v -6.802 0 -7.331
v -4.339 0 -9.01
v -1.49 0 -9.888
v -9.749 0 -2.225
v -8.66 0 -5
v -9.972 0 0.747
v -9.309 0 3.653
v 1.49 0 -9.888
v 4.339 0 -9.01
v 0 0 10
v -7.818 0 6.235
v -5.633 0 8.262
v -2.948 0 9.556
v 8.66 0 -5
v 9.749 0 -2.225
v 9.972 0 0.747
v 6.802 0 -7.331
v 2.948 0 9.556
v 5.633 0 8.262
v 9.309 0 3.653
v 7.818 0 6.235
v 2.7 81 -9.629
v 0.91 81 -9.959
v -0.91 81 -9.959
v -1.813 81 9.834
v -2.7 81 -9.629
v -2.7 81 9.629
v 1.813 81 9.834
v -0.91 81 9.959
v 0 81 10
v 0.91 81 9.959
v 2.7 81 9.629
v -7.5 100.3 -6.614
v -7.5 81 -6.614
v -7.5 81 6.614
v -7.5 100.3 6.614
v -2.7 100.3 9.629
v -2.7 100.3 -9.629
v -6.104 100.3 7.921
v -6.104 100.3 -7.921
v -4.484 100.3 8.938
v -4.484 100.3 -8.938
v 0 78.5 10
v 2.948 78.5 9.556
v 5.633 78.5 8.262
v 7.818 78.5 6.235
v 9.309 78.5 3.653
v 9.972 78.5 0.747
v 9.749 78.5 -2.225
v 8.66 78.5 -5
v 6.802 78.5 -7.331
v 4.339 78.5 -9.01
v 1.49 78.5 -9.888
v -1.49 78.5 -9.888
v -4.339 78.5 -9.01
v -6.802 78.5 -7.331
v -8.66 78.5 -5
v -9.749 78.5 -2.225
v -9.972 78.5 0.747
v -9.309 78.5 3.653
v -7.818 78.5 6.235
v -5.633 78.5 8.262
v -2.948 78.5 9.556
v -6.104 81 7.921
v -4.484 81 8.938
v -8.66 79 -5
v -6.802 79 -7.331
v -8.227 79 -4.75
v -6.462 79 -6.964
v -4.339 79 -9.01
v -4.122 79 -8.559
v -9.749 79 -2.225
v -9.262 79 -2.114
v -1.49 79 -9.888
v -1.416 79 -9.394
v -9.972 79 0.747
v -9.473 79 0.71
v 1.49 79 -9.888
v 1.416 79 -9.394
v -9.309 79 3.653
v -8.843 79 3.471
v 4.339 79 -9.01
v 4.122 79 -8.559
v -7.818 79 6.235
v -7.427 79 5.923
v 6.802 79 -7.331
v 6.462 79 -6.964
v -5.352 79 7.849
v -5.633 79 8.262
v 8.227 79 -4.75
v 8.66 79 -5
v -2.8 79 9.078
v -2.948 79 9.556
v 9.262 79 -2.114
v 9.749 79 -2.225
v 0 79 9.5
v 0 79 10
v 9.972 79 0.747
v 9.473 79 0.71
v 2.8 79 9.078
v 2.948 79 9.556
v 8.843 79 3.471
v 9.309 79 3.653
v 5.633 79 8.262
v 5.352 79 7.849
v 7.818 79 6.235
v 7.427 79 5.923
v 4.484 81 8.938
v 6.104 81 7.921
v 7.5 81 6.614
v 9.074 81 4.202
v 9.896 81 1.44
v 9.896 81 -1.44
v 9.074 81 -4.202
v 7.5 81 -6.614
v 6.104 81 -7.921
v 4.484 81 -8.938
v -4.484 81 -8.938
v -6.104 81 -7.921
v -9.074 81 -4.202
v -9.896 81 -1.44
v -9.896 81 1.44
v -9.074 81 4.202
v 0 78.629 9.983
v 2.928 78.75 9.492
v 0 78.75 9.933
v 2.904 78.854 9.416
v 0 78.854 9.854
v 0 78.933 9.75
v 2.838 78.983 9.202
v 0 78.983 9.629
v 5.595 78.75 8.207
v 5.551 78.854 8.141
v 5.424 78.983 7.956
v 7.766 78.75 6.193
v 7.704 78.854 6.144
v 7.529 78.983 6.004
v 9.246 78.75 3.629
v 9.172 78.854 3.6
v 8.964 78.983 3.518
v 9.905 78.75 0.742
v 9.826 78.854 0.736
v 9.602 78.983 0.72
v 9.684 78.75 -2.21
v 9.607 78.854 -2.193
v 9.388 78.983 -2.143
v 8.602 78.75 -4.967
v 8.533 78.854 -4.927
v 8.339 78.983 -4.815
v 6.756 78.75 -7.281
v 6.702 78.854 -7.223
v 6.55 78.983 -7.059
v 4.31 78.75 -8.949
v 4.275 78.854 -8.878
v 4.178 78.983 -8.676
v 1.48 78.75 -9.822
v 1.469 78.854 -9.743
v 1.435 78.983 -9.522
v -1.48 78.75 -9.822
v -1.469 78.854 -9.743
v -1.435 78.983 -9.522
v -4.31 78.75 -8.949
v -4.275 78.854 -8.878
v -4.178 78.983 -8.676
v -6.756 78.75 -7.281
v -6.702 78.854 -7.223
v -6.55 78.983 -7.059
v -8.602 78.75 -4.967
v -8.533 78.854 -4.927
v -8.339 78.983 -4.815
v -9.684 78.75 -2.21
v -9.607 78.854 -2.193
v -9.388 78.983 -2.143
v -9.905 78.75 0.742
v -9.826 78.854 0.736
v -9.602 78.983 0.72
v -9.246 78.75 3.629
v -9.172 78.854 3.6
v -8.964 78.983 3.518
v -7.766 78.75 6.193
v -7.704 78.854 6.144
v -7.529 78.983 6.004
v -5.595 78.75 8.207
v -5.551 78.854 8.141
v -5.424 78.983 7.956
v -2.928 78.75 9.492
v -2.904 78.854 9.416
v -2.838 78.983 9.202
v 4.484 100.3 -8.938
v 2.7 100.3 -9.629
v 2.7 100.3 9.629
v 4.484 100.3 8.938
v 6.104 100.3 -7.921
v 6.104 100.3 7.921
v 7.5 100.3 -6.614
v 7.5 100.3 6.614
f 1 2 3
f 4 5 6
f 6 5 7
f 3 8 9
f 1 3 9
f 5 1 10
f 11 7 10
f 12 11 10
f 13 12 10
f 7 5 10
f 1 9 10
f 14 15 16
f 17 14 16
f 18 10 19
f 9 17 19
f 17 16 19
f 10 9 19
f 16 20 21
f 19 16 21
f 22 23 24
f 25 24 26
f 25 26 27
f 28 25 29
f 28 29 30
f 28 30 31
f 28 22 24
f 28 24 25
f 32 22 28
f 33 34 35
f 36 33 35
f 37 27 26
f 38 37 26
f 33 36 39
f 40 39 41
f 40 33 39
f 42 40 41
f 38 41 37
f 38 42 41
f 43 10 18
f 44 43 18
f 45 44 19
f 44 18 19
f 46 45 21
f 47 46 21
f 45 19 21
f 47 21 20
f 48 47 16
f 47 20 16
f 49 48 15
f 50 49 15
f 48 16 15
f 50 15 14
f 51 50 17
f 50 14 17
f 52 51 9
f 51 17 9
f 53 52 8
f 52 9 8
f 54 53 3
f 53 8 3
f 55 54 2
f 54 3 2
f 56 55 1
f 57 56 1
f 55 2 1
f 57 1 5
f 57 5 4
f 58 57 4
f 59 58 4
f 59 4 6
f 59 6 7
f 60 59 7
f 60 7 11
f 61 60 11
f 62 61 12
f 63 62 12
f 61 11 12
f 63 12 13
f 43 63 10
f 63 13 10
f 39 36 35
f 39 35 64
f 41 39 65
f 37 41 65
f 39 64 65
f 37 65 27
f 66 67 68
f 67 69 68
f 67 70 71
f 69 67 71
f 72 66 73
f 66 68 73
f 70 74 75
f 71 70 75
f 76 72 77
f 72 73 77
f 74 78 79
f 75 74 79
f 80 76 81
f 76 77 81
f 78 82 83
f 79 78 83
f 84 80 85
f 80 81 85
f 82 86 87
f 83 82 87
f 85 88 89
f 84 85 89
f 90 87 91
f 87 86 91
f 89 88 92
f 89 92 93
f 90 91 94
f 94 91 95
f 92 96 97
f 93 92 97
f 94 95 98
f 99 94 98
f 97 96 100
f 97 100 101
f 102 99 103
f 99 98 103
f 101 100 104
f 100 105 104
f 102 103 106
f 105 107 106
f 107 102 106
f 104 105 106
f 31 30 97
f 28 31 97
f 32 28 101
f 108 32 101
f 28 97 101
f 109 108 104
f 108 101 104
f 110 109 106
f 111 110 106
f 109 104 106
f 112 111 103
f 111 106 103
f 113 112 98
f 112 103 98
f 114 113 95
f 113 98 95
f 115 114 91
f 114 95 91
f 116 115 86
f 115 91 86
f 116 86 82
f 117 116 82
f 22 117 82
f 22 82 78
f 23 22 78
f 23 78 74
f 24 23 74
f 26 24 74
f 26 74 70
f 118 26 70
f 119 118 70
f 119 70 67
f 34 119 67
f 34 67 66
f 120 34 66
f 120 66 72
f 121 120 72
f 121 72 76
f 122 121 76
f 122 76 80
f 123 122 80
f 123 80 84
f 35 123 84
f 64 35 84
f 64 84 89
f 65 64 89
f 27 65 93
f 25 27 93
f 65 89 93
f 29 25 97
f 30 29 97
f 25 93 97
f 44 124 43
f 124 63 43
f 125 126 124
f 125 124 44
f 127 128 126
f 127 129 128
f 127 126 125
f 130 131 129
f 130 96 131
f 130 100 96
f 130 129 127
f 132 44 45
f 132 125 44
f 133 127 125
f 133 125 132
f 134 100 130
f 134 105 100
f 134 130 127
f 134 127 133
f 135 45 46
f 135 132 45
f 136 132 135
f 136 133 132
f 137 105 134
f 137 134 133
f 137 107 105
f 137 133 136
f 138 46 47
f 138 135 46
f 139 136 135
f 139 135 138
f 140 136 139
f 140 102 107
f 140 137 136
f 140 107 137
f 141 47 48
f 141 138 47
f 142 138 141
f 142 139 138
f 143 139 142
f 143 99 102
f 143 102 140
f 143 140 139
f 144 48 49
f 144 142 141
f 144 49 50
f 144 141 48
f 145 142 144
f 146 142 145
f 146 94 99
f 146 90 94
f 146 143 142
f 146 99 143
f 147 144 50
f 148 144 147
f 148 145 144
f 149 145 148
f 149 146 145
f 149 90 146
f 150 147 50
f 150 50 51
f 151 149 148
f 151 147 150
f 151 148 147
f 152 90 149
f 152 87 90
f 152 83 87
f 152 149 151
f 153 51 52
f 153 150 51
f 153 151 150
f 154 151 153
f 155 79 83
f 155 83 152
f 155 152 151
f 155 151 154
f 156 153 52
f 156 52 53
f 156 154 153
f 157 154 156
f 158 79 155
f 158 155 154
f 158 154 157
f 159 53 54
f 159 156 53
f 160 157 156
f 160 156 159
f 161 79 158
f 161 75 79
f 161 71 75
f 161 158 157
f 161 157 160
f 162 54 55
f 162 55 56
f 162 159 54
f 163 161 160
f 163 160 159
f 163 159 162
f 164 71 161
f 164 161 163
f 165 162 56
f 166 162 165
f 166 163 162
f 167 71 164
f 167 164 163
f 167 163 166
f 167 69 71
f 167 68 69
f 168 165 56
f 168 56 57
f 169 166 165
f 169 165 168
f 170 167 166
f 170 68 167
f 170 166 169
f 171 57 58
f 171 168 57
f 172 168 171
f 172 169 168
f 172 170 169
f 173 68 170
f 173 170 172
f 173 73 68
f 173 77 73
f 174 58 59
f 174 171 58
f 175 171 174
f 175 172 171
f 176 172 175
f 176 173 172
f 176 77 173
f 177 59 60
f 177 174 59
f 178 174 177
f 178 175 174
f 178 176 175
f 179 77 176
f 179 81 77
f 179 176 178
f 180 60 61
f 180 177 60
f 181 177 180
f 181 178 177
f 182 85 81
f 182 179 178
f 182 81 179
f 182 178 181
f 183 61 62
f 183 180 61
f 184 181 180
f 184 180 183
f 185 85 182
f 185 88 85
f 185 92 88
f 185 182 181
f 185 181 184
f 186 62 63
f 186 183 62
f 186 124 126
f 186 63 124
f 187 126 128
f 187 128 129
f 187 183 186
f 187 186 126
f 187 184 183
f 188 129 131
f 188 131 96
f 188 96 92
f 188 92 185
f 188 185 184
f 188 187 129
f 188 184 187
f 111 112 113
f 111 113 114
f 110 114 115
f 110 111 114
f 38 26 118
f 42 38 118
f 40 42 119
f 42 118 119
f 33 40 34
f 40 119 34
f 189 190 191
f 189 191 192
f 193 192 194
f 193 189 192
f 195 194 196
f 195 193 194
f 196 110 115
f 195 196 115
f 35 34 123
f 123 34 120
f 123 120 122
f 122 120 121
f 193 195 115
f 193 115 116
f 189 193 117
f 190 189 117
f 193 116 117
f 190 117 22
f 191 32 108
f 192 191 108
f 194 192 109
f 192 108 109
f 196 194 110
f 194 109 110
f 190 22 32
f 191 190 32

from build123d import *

# Parameters (mm, degrees)
SKETCH1_R           = 10
BOSS_EXTRUDE1_DEPTH = 79
FILLET1_R           = 0.5
SKETCH2_R           = 10
BOSS_EXTRUDE2_DEPTH = 2
BOSS_EXTRUDE3_DEPTH = 19.3


with BuildPart() as part:
    # Sketch1 → Boss-Extrude1 (new body)
    with BuildSketch(Plane(origin=(0, 0, 0), x_dir=(1, 0, 0), z_dir=(0, 1, 0))):
        with Locations(Location((0, 0, 0), (0, 0, 270))):
            Circle(SKETCH1_R)
    extrude(amount=BOSS_EXTRUDE1_DEPTH)

    # Fillet1
    fillet1_edges = [part.edges().sort_by_distance(p)[0] for p in [
        (0, 79, -10),
    ]]
    fillet(fillet1_edges, radius=FILLET1_R)

    # Sketch2 → Boss-Extrude2 (add)
    with BuildSketch(Plane(origin=(0, 79, 0), x_dir=(1, 0, 0), z_dir=(0, 1, 0))):
        with Locations(Location((0, 0, 0), (0, 0, 270))):
            Circle(SKETCH2_R)
    extrude(amount=BOSS_EXTRUDE2_DEPTH)

    # Sketch3 → Boss-Extrude3 (add)
    with BuildSketch(Plane(origin=(0, 81, 0), x_dir=(1, 0, 0), z_dir=(0, 1, 0))):
        with BuildLine():
            ThreePointArc((-2.7, 9.628603222), (-5.318024822, 8.468684195), (-7.5, 6.614378278))
            Line((-7.5, 6.614378278), (-7.5, -6.614378278))
            ThreePointArc((-7.5, -6.614378278), (-5.318024822, -8.468684195), (-2.7, -9.628603222))
            Line((-2.7, -9.628603222), (-2.7, 9.628603222))
        make_face()
        with BuildLine():
            ThreePointArc((7.5, 6.614378278), (5.318024822, 8.468684195), (2.7, 9.628603222))
            Line((2.7, 9.628603222), (2.7, -9.628603222))
            ThreePointArc((2.7, -9.628603222), (5.318024822, -8.468684195), (7.5, -6.614378278))
            Line((7.5, -6.614378278), (7.5, 6.614378278))
        make_face()
    extrude(amount=BOSS_EXTRUDE3_DEPTH)


solid = part.part
